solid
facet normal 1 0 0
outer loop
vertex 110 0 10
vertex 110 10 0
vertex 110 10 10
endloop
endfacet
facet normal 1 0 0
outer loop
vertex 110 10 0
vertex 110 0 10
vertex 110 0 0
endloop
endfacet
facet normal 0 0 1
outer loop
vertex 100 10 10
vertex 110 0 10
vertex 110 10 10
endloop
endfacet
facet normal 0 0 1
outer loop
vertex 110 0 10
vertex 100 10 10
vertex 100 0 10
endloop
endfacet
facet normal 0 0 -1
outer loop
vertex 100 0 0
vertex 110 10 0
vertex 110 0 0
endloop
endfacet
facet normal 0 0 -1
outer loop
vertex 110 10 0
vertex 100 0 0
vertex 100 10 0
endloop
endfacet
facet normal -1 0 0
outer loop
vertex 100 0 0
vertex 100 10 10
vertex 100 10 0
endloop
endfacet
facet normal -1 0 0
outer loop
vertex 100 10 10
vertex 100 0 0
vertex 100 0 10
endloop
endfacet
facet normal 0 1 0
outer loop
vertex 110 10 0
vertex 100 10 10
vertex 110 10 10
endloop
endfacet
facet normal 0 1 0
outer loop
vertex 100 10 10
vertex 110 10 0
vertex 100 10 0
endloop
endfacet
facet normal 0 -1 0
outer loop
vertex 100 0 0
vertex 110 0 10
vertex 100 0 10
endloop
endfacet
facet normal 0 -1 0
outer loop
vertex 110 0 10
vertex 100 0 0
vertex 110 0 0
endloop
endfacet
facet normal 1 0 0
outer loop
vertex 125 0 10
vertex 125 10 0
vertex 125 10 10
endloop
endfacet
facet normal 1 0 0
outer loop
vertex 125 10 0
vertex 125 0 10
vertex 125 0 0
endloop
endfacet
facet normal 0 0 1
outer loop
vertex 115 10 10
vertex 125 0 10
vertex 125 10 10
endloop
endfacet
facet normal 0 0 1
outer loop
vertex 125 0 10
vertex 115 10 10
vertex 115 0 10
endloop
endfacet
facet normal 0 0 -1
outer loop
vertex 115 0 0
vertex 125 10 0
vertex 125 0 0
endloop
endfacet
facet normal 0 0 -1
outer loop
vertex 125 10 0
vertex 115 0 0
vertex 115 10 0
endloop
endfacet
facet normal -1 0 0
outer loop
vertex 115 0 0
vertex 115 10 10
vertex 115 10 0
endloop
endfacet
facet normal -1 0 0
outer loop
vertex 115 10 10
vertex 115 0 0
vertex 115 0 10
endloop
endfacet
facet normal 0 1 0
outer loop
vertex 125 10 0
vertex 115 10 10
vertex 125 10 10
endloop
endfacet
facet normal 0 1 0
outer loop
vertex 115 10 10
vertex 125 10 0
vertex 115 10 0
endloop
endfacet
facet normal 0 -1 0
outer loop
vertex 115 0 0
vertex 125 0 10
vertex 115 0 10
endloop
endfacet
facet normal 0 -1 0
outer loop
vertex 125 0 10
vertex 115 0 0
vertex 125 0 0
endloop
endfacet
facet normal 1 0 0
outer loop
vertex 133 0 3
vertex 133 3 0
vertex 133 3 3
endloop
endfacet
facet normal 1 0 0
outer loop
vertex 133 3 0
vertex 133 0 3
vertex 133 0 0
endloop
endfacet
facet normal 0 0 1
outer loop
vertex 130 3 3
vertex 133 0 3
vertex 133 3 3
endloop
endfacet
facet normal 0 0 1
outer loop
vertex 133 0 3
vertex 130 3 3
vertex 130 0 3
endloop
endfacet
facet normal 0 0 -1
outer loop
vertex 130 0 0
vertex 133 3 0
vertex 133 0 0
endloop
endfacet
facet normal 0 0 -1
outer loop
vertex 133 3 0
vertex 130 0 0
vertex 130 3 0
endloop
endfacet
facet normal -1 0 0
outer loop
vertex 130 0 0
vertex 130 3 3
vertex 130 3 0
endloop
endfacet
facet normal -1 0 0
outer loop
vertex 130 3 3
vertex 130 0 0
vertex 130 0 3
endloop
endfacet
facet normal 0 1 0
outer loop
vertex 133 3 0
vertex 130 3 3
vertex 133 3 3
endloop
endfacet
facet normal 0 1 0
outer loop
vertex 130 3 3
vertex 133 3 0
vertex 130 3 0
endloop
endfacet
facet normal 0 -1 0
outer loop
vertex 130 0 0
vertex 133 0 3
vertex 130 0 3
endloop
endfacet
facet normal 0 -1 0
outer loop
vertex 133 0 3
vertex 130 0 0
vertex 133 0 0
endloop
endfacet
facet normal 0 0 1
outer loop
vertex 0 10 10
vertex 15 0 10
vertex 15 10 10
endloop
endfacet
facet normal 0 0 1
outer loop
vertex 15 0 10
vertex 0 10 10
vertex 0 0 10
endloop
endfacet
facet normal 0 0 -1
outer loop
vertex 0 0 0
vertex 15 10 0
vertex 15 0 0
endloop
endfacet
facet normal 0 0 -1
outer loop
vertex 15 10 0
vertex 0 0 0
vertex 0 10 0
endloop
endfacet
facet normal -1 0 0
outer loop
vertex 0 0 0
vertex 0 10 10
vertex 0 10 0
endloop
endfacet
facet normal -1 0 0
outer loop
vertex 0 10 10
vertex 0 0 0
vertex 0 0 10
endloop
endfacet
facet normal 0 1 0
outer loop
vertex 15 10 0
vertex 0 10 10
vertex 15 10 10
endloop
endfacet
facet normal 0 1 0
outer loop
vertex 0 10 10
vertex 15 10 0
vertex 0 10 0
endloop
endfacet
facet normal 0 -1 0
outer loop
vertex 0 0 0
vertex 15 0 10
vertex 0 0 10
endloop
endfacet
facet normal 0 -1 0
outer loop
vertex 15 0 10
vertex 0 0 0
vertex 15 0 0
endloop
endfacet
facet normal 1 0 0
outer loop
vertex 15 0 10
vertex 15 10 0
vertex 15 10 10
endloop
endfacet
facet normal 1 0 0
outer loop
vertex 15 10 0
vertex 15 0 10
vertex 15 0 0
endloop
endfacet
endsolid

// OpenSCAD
module pair() {
  cube(10);
  translate([15, 0, 0]) cube(10);
}

translate([100, 0, 0]) {
  pair();
  translate([30, 0, 0]) cube(3);
}

difference() {
  for (x = [0, 5]) translate([x, 0, 0]) cube(10);
}

%cube(500);
